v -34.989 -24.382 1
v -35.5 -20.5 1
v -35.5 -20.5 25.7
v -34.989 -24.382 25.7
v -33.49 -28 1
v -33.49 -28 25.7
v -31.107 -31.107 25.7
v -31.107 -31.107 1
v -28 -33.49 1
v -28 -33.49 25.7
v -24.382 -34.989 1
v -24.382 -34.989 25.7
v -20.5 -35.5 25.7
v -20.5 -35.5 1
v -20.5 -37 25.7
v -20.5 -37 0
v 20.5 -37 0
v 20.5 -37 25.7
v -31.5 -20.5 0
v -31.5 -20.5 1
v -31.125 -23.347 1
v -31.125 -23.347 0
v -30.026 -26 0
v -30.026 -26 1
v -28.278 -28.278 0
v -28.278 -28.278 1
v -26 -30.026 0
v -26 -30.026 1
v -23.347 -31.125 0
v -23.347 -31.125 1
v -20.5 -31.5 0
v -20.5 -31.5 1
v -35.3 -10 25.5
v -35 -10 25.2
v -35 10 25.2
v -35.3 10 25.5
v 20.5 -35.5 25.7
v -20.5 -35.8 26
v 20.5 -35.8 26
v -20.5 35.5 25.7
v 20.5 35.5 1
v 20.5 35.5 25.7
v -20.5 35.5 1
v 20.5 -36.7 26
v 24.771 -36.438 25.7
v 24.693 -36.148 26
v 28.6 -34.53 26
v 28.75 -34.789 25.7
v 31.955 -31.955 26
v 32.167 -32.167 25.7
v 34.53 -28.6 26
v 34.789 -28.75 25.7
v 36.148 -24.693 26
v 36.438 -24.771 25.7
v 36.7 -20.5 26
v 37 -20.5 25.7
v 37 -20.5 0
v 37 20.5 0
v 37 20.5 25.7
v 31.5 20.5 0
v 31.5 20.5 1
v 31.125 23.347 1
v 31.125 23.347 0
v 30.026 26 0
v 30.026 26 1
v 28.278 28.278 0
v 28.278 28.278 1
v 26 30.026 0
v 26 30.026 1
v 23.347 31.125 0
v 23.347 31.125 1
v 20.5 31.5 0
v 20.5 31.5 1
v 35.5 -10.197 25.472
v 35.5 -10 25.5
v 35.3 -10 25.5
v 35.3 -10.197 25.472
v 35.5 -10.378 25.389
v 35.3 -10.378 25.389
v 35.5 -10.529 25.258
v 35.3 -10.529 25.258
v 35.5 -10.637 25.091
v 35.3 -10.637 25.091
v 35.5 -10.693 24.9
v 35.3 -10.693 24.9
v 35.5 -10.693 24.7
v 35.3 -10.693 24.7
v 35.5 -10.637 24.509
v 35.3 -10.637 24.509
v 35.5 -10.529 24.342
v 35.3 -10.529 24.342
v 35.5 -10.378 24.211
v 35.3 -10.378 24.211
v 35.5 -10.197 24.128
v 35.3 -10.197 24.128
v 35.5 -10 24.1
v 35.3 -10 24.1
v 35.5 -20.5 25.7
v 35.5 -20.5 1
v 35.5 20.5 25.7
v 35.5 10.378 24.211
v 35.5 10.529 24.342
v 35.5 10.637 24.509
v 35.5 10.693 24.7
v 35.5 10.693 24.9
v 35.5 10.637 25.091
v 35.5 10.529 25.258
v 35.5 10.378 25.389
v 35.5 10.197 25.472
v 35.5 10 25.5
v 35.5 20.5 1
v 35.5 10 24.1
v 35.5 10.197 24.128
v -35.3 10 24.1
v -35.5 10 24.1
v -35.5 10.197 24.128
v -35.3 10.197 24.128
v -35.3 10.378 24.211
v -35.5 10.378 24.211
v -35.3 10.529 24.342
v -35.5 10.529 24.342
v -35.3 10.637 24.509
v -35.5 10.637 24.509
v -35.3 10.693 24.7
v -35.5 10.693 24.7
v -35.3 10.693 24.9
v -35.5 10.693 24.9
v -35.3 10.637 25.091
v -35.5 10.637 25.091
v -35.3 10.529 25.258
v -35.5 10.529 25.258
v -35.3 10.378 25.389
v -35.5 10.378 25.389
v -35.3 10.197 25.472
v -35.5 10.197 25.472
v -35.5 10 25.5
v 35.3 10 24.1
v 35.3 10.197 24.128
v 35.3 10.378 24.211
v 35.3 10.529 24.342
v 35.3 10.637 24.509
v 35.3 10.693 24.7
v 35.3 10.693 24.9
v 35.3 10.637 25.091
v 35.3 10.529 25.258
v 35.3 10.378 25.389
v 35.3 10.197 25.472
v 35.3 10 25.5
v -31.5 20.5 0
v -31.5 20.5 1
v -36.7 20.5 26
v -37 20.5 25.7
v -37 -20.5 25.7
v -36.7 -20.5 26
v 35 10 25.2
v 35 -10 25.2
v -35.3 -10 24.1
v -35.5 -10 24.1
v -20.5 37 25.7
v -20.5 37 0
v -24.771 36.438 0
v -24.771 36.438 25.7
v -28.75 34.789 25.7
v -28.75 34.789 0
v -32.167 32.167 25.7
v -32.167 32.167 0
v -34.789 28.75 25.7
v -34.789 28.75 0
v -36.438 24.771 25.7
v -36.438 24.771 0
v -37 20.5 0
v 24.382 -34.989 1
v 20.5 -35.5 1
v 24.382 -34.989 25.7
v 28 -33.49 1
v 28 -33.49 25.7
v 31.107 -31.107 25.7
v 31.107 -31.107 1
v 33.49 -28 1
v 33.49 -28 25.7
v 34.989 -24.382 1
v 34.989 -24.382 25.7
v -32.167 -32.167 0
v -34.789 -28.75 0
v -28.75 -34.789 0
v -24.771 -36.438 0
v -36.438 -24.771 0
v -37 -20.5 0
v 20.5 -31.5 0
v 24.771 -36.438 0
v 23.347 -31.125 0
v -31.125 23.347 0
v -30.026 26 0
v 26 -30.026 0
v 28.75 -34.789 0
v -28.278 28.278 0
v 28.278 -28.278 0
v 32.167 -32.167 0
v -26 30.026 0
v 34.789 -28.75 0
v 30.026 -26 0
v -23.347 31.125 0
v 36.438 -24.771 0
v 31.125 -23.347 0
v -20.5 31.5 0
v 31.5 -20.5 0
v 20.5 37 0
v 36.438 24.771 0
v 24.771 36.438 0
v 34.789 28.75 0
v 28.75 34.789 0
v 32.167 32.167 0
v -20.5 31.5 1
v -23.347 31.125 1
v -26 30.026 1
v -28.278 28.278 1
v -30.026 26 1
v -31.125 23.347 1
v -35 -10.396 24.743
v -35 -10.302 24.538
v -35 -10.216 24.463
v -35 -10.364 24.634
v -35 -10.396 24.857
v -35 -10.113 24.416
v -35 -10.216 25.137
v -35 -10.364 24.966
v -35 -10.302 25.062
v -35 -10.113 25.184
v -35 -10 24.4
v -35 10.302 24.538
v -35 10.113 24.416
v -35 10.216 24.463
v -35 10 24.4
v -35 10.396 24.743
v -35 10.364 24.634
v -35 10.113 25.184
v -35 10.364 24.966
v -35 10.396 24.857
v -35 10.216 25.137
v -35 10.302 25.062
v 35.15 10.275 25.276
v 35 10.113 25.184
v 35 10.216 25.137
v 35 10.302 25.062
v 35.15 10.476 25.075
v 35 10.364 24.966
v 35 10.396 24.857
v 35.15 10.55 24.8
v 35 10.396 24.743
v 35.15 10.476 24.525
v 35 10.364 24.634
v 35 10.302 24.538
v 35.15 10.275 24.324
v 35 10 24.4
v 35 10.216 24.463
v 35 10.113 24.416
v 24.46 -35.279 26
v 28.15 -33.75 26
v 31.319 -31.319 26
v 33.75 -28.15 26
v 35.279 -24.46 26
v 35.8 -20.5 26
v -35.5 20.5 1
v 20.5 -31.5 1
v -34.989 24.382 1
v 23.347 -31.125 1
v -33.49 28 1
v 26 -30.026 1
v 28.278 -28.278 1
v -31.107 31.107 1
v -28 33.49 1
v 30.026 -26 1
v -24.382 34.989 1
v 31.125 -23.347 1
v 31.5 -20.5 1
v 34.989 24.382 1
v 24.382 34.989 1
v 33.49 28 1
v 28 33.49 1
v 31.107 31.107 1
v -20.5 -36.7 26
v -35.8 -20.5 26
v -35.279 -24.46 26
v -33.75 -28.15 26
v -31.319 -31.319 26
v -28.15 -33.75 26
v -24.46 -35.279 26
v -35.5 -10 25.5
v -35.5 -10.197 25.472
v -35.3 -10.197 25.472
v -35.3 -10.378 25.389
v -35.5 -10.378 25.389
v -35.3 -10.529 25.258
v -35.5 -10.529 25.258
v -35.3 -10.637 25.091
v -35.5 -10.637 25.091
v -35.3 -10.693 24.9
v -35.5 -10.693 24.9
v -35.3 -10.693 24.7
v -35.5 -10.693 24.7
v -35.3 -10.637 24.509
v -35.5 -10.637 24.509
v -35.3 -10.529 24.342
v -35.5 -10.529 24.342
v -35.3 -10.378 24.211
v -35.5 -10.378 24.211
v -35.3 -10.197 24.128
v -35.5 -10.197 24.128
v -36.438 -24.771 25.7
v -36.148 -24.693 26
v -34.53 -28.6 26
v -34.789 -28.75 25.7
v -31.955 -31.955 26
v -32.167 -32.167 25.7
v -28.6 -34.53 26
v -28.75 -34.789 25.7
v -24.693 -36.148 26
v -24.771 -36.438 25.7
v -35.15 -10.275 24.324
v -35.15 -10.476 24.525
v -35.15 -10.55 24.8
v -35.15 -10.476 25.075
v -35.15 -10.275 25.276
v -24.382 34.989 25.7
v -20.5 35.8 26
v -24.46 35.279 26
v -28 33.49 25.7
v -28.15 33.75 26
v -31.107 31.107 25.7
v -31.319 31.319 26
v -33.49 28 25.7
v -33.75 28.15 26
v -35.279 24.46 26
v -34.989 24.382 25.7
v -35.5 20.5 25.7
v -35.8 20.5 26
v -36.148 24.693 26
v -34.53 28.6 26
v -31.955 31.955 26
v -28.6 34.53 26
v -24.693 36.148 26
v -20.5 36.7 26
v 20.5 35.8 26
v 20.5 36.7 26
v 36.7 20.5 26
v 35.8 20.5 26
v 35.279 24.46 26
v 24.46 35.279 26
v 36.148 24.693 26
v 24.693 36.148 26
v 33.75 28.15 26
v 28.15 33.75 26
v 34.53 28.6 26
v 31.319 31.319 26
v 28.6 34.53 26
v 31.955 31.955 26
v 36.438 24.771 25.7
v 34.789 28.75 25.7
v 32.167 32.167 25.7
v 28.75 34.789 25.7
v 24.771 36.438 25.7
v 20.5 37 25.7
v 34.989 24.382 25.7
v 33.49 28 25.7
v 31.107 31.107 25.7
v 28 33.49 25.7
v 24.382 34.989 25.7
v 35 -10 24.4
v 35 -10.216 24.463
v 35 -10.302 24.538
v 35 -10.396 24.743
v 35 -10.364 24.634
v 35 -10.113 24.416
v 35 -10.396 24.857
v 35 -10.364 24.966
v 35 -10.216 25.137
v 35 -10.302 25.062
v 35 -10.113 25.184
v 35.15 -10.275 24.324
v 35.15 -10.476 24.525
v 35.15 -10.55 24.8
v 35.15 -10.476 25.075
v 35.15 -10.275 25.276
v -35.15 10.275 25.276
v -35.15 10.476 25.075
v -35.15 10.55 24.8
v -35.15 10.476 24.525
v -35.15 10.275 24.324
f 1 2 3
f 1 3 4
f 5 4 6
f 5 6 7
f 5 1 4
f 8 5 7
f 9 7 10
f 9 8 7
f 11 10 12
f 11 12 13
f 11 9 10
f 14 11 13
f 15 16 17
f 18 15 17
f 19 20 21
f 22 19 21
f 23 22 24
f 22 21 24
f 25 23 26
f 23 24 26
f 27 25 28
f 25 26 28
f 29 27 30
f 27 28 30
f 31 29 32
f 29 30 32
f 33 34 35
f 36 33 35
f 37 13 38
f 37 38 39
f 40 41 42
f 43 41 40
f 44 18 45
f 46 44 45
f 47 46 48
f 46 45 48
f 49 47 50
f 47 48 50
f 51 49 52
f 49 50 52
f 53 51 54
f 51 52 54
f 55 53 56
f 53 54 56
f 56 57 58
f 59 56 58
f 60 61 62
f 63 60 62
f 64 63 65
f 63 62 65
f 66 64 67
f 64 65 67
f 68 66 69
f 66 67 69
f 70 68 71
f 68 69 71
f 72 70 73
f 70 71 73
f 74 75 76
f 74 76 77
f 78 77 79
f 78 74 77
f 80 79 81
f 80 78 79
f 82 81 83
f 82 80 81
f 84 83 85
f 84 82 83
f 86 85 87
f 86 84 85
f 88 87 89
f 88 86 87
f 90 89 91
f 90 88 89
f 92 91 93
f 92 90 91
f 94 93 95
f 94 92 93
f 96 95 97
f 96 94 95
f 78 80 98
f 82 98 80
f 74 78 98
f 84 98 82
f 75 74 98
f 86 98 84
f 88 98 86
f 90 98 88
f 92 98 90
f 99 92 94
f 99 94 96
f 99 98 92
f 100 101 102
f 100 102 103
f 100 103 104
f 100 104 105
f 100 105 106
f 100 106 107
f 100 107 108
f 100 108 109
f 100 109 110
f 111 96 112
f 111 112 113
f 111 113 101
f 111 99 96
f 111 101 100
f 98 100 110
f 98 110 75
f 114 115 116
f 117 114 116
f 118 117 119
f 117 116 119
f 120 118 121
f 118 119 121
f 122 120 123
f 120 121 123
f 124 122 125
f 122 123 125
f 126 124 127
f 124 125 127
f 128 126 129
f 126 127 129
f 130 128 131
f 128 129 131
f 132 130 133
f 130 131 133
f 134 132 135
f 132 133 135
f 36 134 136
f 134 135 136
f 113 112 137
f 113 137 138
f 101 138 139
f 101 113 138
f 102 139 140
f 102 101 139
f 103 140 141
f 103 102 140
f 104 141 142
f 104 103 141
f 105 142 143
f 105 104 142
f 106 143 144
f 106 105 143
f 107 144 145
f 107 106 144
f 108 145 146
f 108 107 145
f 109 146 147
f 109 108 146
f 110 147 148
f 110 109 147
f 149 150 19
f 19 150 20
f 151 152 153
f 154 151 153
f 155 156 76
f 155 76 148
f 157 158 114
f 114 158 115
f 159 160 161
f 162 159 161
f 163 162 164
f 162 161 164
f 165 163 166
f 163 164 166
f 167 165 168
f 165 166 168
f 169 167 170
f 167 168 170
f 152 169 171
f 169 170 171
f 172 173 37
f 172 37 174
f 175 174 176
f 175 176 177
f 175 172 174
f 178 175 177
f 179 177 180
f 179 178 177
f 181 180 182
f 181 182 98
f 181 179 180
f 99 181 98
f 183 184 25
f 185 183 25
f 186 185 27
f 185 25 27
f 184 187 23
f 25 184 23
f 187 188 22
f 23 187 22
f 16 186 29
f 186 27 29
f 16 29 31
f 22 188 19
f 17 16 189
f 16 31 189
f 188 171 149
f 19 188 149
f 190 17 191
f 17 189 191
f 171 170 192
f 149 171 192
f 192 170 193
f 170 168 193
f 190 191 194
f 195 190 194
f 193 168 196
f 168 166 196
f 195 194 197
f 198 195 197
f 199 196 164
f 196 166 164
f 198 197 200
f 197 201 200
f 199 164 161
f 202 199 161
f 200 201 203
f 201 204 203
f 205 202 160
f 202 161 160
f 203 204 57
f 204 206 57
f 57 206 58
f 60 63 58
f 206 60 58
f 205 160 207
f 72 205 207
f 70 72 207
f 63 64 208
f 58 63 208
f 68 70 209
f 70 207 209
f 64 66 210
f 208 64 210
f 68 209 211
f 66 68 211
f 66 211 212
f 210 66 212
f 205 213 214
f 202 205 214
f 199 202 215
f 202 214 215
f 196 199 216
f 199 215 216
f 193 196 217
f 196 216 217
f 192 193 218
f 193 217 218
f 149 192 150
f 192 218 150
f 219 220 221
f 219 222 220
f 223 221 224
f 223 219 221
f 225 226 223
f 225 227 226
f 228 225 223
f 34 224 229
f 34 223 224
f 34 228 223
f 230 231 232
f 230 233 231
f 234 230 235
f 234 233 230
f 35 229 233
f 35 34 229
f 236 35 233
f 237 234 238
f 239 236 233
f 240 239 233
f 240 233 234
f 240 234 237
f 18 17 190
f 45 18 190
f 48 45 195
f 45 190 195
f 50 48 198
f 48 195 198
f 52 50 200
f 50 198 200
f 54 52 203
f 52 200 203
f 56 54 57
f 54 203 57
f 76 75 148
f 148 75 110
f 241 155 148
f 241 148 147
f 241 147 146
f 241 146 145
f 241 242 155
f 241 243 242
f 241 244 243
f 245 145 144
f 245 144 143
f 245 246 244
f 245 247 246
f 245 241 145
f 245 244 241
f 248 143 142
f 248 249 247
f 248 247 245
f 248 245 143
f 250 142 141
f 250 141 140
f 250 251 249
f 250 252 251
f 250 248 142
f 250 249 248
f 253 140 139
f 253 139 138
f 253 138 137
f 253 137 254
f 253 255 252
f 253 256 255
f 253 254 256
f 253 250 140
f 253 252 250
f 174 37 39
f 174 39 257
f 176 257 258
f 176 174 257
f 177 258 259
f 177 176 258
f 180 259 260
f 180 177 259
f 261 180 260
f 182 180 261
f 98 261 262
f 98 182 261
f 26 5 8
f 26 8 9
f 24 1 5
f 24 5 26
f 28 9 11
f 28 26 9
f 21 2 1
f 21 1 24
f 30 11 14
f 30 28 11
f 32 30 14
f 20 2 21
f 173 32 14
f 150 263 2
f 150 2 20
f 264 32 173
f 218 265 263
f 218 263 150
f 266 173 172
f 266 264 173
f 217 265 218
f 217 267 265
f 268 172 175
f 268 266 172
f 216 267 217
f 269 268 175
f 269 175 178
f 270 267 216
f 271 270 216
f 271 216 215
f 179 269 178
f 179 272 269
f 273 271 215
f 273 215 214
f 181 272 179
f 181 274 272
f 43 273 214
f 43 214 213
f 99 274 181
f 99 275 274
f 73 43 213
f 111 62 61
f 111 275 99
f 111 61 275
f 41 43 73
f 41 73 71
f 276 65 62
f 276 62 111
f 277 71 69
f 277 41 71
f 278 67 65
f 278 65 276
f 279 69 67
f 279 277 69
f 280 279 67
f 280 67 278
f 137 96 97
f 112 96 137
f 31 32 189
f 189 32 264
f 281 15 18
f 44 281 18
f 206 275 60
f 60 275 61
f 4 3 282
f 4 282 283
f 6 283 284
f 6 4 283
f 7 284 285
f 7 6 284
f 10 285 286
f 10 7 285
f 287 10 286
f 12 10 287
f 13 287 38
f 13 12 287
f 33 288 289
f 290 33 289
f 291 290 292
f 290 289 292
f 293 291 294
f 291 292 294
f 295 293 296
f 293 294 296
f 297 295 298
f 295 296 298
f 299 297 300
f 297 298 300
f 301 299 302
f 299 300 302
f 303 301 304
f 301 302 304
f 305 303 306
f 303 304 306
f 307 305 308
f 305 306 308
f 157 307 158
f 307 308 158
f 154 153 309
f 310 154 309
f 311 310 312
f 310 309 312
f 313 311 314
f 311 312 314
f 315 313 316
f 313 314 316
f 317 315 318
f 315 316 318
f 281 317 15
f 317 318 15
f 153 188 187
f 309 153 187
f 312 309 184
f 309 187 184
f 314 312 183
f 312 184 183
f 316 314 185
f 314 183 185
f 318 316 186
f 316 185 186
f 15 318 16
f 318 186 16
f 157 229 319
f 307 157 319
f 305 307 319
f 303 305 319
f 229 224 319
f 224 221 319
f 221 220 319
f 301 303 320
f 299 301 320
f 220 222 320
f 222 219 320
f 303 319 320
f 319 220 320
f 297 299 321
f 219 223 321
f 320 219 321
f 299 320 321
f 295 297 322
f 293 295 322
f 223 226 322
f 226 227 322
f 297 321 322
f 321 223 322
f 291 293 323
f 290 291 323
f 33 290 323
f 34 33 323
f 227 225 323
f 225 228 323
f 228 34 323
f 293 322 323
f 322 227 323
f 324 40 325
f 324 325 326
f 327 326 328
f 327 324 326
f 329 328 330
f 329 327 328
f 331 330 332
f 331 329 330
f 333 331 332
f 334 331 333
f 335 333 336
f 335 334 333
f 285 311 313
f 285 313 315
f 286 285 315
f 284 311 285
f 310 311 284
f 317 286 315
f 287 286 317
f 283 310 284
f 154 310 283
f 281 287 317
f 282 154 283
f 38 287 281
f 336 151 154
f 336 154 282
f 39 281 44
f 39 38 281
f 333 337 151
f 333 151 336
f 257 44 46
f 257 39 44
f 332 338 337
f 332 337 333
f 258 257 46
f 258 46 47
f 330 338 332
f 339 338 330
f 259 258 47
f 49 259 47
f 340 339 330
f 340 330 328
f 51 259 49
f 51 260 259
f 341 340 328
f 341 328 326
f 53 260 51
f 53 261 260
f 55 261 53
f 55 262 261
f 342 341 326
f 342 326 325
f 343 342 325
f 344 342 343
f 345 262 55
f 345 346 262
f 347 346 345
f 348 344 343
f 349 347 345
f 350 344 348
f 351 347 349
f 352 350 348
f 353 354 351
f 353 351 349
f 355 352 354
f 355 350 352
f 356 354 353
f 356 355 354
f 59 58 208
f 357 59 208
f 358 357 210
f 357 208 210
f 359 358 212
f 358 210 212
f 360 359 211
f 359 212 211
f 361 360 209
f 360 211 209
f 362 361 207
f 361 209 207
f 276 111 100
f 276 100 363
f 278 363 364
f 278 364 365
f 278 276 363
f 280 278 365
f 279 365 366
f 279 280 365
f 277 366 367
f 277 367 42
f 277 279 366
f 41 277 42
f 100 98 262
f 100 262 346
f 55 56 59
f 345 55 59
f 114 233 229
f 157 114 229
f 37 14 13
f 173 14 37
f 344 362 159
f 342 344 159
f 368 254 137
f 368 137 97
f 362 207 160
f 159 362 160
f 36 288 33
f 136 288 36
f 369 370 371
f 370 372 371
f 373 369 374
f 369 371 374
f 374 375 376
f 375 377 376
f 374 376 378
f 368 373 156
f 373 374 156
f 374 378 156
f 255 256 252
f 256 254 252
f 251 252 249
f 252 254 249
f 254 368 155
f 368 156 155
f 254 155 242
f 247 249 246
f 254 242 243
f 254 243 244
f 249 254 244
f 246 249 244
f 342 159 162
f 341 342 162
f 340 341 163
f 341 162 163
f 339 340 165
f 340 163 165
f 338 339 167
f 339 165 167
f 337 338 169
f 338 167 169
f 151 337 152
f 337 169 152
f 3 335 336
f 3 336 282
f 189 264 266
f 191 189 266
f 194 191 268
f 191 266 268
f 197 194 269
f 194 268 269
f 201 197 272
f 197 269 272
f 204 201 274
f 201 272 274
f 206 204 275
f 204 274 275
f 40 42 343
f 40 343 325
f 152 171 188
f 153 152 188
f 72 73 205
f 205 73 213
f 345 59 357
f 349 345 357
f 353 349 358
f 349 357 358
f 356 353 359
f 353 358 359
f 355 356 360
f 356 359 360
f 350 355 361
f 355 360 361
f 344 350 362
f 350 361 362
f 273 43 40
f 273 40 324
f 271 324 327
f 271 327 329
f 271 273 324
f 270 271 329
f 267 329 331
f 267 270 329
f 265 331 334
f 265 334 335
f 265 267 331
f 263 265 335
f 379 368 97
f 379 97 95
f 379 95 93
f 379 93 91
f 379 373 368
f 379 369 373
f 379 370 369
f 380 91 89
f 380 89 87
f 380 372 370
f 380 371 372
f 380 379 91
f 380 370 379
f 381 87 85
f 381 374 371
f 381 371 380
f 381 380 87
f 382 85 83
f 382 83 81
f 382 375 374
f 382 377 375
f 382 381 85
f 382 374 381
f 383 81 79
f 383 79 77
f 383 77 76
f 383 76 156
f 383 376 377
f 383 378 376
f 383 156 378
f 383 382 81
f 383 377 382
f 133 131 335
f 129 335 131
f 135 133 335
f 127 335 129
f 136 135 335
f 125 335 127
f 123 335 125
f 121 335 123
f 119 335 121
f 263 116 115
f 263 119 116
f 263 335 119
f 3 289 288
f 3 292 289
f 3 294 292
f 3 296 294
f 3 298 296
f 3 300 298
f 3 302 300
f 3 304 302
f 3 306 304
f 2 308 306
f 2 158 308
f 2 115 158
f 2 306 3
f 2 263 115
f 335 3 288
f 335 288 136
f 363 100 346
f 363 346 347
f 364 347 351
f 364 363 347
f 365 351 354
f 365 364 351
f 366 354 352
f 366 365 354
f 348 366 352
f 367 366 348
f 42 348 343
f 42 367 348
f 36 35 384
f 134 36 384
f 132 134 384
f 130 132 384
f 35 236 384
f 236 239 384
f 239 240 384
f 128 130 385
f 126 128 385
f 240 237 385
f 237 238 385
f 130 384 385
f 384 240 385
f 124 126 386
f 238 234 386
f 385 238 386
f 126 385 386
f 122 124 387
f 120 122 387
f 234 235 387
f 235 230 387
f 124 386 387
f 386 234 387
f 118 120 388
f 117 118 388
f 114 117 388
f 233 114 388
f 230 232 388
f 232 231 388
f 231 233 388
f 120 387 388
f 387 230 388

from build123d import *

# Parameters (mm, degrees)
PAD_DEPTH       = 1
PAD001_DEPTH    = 26
POCKET_DEPTH    = 25
POCKET001_DEPTH = 1.001
PAD002_DEPTH    = 0.5
CHAMFER_SIZE    = 0.3
CHAMFER001_SIZE = 0.3
CHAMFER002_SIZE = 0.3
CHAMFER003_SIZE = 0.3


with BuildPart() as part:
    # Sketch → Pad (new body)
    with BuildSketch(Plane.XY):
        with BuildLine():
            Line((-35.5, 20.5), (-35.5, -20.5))
            ThreePointArc((-35.5, -20.5), (-31.106602, -31.106602), (-20.5, -35.5))
            Line((-20.5, -35.5), (20.5, -35.5))
            ThreePointArc((20.5, -35.5), (31.106602, -31.106602), (35.5, -20.5))
            Line((35.5, -20.5), (35.5, 20.5))
            ThreePointArc((35.5, 20.5), (31.106602, 31.106602), (20.5, 35.5))
            Line((20.5, 35.5), (-20.5, 35.5))
            ThreePointArc((-20.5, 35.5), (-31.106602, 31.106602), (-35.5, 20.5))
        make_face()
    extrude(amount=PAD_DEPTH)

    # Sketch001 → Pad001 (join)
    with BuildSketch(Plane.XY):
        with BuildLine():
            Line((-37, 20.5), (-37, -20.5))
            ThreePointArc((-37, -20.5), (-32.167262, -32.167262), (-20.5, -37))
            Line((-20.5, -37), (20.5, -37))
            ThreePointArc((20.5, -37), (32.167262, -32.167262), (37, -20.5))
            Line((37, -20.5), (37, 20.5))
            ThreePointArc((37, 20.5), (32.167262, 32.167262), (20.5, 37))
            Line((20.5, 37), (-20.5, 37))
            ThreePointArc((-20.5, 37), (-32.167262, 32.167262), (-37, 20.5))
        make_face()
    extrude(amount=PAD001_DEPTH)

    # Sketch002 → Pocket (cut)
    with BuildSketch(Plane.XY.offset(1)):
        with BuildLine():
            Line((-35.5, 20.5), (-35.5, -20.5))
            ThreePointArc((-35.5, -20.5), (-31.106602, -31.106602), (-20.5, -35.5))
            Line((-20.5, -35.5), (20.5, -35.5))
            ThreePointArc((20.5, -35.5), (31.106602, -31.106602), (35.5, -20.5))
            Line((35.5, -20.5), (35.5, 20.5))
            ThreePointArc((35.5, 20.5), (31.106602, 31.106602), (20.5, 35.5))
            Line((20.5, 35.5), (-20.5, 35.5))
            ThreePointArc((-20.5, 35.5), (-31.106602, 31.106602), (-35.5, 20.5))
        make_face()
    extrude(amount=POCKET_DEPTH, mode=Mode.SUBTRACT)

    # Sketch003 (on Face19 of Pocket) → Pocket001 (cut, through all)
    with BuildSketch(Plane.XY.offset(1)):
        with BuildLine():
            Line((-31.5, 20.5), (-31.5, -20.5))
            ThreePointArc((-31.5, -20.5), (-28.278175, -28.278175), (-20.5, -31.5))
            Line((-20.5, -31.5), (20.5, -31.5))
            ThreePointArc((20.5, -31.5), (28.278175, -28.278175), (31.5, -20.5))
            Line((31.5, -20.5), (31.5, 20.5))
            ThreePointArc((31.5, 20.5), (28.278175, 28.278175), (20.5, 31.5))
            Line((20.5, 31.5), (-20.5, 31.5))
            ThreePointArc((-20.5, 31.5), (-28.278175, 28.278175), (-31.5, 20.5))
        make_face()
    extrude(amount=-POCKET001_DEPTH, mode=Mode.SUBTRACT)

    # Sketch004 (on Face19 of Pocket001) → Pad002 (join)
    with BuildSketch(Plane.YZ.offset(-35.5)):
        with BuildLine():
            ThreePointArc((-10, 25.5), (-10.7, 24.8), (-10, 24.1))
            Line((-10, 24.1), (10, 24.1))
            ThreePointArc((10, 24.1), (10.7, 24.8), (10, 25.5))
            Line((-10, 25.5), (10, 25.5))
        make_face()
    pad002 = extrude(amount=PAD002_DEPTH)

    # Mirrored: Pad002 across YZ
    add(pad002.mirror(Plane.YZ))

    # Chamfer
    chamfer_edges = [part.edges().sort_by_distance(p)[0] for p in [
        (-35, 0, 25.5),
    ]]
    chamfer(chamfer_edges, length=CHAMFER_SIZE)

    # Chamfer001
    chamfer001_edges = [part.edges().sort_by_distance(p)[0] for p in [
        (35, 0, 25.5),
    ]]
    chamfer(chamfer001_edges, length=CHAMFER001_SIZE)

    # Chamfer002
    chamfer002_edges = [part.edges().sort_by_distance(p)[0] for p in [
        (0, -35.5, 26),
    ]]
    chamfer(chamfer002_edges, length=CHAMFER002_SIZE)

    # Chamfer003
    chamfer003_edges = [part.edges().sort_by_distance(p)[0] for p in [
        (37, 0, 26),
    ]]
    chamfer(chamfer003_edges, length=CHAMFER003_SIZE)


solid = part.part
